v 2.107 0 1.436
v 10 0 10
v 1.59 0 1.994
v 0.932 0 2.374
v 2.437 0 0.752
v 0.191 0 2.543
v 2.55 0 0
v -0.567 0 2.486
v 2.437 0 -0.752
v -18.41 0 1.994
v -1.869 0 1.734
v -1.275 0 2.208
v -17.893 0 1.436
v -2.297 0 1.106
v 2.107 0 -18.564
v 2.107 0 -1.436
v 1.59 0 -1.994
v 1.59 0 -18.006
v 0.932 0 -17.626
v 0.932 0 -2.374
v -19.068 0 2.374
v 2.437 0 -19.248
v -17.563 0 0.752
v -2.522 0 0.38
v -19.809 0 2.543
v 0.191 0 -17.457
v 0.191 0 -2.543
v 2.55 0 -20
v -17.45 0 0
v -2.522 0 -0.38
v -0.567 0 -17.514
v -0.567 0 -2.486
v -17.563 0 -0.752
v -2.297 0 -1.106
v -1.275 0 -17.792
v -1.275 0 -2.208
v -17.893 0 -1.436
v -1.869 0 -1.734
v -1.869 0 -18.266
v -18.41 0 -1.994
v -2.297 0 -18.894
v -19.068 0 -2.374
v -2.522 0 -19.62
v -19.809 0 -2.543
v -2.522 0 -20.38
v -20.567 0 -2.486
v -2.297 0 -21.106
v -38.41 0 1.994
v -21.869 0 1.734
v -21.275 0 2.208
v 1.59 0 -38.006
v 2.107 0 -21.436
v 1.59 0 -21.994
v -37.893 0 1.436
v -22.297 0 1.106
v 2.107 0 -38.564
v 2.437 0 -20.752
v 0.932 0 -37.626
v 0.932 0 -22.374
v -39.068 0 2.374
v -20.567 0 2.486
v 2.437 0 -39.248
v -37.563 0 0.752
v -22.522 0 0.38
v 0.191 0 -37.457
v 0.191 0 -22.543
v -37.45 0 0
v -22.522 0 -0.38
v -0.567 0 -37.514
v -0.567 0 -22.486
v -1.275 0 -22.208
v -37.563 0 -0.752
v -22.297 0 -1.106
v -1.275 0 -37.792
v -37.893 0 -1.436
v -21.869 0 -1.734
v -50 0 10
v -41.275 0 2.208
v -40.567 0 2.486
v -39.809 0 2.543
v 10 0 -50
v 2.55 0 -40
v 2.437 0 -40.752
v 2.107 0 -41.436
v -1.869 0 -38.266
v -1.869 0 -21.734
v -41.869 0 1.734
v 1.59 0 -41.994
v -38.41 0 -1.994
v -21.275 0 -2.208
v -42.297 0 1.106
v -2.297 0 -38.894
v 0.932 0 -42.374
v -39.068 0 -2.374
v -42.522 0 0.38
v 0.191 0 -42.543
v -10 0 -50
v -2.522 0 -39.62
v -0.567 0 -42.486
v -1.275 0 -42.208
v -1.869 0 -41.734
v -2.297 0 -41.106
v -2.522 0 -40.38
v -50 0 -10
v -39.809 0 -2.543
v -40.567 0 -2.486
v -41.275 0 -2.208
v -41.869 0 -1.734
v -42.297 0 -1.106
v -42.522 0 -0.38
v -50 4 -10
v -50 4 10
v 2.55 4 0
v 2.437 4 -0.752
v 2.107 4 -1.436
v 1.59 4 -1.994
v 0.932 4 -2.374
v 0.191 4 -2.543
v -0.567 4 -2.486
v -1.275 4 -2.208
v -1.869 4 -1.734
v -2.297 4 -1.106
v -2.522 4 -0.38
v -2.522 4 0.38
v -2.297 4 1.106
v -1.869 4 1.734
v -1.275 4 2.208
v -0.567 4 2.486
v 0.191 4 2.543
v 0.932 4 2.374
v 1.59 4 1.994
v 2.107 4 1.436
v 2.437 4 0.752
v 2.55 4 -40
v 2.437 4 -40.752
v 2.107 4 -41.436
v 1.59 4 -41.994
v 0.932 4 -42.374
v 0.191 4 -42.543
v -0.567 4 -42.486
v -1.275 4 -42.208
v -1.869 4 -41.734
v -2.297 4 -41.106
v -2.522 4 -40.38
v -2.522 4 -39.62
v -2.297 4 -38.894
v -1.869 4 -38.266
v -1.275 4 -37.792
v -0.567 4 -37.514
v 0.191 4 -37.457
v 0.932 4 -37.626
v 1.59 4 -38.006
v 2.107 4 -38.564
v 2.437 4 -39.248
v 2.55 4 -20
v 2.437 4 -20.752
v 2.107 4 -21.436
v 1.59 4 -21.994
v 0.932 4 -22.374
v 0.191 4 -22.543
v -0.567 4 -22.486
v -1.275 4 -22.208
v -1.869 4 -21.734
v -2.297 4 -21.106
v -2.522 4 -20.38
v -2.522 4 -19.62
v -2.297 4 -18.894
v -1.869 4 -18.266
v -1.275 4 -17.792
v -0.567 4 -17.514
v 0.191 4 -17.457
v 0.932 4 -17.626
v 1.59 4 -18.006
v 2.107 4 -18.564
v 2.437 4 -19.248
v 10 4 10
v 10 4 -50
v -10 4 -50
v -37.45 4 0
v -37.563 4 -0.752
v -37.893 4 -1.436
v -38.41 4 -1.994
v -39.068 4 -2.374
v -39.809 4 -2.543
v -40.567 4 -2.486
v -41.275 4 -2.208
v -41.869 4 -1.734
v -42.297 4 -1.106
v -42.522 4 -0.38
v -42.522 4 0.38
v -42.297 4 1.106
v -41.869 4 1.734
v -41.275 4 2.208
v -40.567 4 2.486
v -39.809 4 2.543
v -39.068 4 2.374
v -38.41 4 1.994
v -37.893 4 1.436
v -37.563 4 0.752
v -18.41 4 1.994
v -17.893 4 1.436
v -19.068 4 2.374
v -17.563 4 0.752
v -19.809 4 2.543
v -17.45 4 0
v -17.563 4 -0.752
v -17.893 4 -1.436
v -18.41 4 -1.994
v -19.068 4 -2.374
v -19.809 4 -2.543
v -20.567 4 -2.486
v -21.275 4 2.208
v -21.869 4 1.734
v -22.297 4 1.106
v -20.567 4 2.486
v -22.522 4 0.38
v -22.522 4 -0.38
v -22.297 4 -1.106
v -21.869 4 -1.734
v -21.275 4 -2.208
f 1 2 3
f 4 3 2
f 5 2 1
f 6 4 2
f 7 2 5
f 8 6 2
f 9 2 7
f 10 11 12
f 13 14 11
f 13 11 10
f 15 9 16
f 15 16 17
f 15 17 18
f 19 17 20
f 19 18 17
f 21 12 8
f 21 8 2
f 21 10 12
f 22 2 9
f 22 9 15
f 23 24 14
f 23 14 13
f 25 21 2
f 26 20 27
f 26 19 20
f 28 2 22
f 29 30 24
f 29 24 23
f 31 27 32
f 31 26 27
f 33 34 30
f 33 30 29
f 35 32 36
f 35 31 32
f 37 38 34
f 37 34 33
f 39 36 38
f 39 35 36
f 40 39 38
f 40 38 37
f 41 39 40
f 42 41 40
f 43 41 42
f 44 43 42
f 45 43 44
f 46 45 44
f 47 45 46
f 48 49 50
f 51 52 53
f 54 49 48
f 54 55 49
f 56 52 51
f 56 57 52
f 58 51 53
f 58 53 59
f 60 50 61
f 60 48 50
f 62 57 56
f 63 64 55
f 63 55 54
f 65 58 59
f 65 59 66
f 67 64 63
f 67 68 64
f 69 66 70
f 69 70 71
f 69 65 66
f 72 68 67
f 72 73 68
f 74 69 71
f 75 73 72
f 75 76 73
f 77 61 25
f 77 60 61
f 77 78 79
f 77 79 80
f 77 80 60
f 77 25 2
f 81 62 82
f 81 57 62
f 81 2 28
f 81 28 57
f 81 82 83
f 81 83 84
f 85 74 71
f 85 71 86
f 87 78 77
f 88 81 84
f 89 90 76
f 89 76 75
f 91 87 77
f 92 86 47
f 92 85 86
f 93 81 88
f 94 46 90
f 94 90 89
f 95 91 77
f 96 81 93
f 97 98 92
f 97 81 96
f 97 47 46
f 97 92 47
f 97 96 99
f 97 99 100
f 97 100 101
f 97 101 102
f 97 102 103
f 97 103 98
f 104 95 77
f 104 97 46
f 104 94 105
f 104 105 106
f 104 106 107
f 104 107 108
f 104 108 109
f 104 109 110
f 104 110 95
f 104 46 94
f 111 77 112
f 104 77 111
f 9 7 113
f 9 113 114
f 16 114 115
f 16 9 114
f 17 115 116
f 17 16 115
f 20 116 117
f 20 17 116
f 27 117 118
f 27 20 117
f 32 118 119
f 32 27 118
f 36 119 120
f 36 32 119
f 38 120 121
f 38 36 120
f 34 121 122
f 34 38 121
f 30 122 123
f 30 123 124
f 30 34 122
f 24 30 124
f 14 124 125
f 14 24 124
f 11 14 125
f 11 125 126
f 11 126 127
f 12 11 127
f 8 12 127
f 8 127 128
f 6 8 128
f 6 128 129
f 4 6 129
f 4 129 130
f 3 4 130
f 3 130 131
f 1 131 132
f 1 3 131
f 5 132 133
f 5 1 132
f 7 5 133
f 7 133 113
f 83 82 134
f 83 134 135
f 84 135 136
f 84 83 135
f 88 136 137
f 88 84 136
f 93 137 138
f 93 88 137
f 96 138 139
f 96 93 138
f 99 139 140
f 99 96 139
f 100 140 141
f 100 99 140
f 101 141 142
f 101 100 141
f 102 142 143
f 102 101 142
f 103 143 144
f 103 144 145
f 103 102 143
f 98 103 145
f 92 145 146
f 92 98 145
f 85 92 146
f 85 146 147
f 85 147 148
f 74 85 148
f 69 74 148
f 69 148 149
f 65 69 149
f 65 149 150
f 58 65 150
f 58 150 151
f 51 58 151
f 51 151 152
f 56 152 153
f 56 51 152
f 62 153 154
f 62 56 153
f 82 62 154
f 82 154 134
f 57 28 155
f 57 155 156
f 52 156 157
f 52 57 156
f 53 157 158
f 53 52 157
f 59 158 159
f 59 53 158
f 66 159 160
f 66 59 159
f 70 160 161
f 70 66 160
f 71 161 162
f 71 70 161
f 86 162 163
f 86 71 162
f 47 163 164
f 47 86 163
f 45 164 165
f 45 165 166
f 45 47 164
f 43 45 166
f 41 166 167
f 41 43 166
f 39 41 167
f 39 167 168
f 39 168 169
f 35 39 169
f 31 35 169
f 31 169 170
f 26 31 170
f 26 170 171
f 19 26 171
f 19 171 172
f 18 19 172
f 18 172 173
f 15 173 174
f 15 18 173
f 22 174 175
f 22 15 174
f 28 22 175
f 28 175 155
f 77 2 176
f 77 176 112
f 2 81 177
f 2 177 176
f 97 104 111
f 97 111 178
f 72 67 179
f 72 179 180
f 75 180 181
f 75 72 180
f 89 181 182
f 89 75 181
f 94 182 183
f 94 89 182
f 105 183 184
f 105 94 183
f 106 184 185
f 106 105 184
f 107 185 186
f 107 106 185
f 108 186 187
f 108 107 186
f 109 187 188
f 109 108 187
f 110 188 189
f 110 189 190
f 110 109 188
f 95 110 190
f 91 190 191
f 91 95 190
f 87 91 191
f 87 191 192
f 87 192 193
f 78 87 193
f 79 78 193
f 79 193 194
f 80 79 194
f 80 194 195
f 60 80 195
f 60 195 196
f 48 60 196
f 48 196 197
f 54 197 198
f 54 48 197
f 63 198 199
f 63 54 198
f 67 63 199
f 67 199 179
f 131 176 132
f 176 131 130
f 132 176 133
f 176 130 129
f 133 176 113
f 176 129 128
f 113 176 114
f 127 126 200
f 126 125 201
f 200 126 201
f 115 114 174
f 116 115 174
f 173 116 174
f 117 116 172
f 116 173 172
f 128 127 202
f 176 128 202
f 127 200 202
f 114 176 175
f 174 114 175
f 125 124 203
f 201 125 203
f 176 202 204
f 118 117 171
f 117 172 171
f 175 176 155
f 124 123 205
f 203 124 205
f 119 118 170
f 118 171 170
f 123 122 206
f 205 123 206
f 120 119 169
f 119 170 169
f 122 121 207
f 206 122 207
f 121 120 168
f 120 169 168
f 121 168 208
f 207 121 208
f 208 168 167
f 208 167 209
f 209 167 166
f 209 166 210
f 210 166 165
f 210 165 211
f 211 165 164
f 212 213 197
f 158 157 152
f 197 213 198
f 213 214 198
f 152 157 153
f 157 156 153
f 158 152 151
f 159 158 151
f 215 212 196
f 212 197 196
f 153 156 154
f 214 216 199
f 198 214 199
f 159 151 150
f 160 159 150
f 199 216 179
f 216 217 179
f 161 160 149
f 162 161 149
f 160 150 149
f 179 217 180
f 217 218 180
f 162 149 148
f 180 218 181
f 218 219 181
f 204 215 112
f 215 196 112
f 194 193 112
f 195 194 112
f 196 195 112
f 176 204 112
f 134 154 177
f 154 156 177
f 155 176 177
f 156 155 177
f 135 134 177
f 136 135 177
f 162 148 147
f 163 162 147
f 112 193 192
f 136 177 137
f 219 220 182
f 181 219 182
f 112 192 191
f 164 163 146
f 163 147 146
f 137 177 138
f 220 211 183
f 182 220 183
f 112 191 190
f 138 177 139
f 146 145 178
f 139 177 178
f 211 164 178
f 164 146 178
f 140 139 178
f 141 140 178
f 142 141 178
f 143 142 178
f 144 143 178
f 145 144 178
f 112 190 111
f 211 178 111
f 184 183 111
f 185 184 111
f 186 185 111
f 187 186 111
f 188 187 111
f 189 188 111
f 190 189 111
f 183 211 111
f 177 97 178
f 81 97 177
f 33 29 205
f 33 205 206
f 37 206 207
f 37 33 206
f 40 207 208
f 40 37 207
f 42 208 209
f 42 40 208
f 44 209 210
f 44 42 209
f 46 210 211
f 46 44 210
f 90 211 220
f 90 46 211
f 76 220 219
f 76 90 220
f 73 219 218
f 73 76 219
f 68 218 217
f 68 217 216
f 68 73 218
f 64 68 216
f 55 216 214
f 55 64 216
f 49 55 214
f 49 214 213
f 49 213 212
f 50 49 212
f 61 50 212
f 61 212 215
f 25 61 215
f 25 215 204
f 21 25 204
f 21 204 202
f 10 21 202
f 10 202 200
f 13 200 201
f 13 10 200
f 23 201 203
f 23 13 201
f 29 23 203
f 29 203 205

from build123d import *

# Parameters (mm, degrees)
SKETCH1_R           = 2.55
BOSS_EXTRUDE1_DEPTH = 4


with BuildPart() as part:
    # Sketch1 → Boss-Extrude1 (new body)
    with BuildSketch(Plane(origin=(0, 0, 0), x_dir=(1, 0, 0), z_dir=(0, 1, 0))):
        Polygon((10, -10), (-50, -10), (-50, 10), (-10, 50), (10, 50), align=None)
        with Locations((-20, 0)):
            Circle(SKETCH1_R, mode=Mode.SUBTRACT)
        with Locations((-40, 0)):
            Circle(SKETCH1_R, mode=Mode.SUBTRACT)
        Circle(SKETCH1_R, mode=Mode.SUBTRACT)
        with Locations((0, 20)):
            Circle(SKETCH1_R, mode=Mode.SUBTRACT)
        with Locations((0, 40)):
            Circle(SKETCH1_R, mode=Mode.SUBTRACT)
    extrude(amount=BOSS_EXTRUDE1_DEPTH)


solid = part.part
